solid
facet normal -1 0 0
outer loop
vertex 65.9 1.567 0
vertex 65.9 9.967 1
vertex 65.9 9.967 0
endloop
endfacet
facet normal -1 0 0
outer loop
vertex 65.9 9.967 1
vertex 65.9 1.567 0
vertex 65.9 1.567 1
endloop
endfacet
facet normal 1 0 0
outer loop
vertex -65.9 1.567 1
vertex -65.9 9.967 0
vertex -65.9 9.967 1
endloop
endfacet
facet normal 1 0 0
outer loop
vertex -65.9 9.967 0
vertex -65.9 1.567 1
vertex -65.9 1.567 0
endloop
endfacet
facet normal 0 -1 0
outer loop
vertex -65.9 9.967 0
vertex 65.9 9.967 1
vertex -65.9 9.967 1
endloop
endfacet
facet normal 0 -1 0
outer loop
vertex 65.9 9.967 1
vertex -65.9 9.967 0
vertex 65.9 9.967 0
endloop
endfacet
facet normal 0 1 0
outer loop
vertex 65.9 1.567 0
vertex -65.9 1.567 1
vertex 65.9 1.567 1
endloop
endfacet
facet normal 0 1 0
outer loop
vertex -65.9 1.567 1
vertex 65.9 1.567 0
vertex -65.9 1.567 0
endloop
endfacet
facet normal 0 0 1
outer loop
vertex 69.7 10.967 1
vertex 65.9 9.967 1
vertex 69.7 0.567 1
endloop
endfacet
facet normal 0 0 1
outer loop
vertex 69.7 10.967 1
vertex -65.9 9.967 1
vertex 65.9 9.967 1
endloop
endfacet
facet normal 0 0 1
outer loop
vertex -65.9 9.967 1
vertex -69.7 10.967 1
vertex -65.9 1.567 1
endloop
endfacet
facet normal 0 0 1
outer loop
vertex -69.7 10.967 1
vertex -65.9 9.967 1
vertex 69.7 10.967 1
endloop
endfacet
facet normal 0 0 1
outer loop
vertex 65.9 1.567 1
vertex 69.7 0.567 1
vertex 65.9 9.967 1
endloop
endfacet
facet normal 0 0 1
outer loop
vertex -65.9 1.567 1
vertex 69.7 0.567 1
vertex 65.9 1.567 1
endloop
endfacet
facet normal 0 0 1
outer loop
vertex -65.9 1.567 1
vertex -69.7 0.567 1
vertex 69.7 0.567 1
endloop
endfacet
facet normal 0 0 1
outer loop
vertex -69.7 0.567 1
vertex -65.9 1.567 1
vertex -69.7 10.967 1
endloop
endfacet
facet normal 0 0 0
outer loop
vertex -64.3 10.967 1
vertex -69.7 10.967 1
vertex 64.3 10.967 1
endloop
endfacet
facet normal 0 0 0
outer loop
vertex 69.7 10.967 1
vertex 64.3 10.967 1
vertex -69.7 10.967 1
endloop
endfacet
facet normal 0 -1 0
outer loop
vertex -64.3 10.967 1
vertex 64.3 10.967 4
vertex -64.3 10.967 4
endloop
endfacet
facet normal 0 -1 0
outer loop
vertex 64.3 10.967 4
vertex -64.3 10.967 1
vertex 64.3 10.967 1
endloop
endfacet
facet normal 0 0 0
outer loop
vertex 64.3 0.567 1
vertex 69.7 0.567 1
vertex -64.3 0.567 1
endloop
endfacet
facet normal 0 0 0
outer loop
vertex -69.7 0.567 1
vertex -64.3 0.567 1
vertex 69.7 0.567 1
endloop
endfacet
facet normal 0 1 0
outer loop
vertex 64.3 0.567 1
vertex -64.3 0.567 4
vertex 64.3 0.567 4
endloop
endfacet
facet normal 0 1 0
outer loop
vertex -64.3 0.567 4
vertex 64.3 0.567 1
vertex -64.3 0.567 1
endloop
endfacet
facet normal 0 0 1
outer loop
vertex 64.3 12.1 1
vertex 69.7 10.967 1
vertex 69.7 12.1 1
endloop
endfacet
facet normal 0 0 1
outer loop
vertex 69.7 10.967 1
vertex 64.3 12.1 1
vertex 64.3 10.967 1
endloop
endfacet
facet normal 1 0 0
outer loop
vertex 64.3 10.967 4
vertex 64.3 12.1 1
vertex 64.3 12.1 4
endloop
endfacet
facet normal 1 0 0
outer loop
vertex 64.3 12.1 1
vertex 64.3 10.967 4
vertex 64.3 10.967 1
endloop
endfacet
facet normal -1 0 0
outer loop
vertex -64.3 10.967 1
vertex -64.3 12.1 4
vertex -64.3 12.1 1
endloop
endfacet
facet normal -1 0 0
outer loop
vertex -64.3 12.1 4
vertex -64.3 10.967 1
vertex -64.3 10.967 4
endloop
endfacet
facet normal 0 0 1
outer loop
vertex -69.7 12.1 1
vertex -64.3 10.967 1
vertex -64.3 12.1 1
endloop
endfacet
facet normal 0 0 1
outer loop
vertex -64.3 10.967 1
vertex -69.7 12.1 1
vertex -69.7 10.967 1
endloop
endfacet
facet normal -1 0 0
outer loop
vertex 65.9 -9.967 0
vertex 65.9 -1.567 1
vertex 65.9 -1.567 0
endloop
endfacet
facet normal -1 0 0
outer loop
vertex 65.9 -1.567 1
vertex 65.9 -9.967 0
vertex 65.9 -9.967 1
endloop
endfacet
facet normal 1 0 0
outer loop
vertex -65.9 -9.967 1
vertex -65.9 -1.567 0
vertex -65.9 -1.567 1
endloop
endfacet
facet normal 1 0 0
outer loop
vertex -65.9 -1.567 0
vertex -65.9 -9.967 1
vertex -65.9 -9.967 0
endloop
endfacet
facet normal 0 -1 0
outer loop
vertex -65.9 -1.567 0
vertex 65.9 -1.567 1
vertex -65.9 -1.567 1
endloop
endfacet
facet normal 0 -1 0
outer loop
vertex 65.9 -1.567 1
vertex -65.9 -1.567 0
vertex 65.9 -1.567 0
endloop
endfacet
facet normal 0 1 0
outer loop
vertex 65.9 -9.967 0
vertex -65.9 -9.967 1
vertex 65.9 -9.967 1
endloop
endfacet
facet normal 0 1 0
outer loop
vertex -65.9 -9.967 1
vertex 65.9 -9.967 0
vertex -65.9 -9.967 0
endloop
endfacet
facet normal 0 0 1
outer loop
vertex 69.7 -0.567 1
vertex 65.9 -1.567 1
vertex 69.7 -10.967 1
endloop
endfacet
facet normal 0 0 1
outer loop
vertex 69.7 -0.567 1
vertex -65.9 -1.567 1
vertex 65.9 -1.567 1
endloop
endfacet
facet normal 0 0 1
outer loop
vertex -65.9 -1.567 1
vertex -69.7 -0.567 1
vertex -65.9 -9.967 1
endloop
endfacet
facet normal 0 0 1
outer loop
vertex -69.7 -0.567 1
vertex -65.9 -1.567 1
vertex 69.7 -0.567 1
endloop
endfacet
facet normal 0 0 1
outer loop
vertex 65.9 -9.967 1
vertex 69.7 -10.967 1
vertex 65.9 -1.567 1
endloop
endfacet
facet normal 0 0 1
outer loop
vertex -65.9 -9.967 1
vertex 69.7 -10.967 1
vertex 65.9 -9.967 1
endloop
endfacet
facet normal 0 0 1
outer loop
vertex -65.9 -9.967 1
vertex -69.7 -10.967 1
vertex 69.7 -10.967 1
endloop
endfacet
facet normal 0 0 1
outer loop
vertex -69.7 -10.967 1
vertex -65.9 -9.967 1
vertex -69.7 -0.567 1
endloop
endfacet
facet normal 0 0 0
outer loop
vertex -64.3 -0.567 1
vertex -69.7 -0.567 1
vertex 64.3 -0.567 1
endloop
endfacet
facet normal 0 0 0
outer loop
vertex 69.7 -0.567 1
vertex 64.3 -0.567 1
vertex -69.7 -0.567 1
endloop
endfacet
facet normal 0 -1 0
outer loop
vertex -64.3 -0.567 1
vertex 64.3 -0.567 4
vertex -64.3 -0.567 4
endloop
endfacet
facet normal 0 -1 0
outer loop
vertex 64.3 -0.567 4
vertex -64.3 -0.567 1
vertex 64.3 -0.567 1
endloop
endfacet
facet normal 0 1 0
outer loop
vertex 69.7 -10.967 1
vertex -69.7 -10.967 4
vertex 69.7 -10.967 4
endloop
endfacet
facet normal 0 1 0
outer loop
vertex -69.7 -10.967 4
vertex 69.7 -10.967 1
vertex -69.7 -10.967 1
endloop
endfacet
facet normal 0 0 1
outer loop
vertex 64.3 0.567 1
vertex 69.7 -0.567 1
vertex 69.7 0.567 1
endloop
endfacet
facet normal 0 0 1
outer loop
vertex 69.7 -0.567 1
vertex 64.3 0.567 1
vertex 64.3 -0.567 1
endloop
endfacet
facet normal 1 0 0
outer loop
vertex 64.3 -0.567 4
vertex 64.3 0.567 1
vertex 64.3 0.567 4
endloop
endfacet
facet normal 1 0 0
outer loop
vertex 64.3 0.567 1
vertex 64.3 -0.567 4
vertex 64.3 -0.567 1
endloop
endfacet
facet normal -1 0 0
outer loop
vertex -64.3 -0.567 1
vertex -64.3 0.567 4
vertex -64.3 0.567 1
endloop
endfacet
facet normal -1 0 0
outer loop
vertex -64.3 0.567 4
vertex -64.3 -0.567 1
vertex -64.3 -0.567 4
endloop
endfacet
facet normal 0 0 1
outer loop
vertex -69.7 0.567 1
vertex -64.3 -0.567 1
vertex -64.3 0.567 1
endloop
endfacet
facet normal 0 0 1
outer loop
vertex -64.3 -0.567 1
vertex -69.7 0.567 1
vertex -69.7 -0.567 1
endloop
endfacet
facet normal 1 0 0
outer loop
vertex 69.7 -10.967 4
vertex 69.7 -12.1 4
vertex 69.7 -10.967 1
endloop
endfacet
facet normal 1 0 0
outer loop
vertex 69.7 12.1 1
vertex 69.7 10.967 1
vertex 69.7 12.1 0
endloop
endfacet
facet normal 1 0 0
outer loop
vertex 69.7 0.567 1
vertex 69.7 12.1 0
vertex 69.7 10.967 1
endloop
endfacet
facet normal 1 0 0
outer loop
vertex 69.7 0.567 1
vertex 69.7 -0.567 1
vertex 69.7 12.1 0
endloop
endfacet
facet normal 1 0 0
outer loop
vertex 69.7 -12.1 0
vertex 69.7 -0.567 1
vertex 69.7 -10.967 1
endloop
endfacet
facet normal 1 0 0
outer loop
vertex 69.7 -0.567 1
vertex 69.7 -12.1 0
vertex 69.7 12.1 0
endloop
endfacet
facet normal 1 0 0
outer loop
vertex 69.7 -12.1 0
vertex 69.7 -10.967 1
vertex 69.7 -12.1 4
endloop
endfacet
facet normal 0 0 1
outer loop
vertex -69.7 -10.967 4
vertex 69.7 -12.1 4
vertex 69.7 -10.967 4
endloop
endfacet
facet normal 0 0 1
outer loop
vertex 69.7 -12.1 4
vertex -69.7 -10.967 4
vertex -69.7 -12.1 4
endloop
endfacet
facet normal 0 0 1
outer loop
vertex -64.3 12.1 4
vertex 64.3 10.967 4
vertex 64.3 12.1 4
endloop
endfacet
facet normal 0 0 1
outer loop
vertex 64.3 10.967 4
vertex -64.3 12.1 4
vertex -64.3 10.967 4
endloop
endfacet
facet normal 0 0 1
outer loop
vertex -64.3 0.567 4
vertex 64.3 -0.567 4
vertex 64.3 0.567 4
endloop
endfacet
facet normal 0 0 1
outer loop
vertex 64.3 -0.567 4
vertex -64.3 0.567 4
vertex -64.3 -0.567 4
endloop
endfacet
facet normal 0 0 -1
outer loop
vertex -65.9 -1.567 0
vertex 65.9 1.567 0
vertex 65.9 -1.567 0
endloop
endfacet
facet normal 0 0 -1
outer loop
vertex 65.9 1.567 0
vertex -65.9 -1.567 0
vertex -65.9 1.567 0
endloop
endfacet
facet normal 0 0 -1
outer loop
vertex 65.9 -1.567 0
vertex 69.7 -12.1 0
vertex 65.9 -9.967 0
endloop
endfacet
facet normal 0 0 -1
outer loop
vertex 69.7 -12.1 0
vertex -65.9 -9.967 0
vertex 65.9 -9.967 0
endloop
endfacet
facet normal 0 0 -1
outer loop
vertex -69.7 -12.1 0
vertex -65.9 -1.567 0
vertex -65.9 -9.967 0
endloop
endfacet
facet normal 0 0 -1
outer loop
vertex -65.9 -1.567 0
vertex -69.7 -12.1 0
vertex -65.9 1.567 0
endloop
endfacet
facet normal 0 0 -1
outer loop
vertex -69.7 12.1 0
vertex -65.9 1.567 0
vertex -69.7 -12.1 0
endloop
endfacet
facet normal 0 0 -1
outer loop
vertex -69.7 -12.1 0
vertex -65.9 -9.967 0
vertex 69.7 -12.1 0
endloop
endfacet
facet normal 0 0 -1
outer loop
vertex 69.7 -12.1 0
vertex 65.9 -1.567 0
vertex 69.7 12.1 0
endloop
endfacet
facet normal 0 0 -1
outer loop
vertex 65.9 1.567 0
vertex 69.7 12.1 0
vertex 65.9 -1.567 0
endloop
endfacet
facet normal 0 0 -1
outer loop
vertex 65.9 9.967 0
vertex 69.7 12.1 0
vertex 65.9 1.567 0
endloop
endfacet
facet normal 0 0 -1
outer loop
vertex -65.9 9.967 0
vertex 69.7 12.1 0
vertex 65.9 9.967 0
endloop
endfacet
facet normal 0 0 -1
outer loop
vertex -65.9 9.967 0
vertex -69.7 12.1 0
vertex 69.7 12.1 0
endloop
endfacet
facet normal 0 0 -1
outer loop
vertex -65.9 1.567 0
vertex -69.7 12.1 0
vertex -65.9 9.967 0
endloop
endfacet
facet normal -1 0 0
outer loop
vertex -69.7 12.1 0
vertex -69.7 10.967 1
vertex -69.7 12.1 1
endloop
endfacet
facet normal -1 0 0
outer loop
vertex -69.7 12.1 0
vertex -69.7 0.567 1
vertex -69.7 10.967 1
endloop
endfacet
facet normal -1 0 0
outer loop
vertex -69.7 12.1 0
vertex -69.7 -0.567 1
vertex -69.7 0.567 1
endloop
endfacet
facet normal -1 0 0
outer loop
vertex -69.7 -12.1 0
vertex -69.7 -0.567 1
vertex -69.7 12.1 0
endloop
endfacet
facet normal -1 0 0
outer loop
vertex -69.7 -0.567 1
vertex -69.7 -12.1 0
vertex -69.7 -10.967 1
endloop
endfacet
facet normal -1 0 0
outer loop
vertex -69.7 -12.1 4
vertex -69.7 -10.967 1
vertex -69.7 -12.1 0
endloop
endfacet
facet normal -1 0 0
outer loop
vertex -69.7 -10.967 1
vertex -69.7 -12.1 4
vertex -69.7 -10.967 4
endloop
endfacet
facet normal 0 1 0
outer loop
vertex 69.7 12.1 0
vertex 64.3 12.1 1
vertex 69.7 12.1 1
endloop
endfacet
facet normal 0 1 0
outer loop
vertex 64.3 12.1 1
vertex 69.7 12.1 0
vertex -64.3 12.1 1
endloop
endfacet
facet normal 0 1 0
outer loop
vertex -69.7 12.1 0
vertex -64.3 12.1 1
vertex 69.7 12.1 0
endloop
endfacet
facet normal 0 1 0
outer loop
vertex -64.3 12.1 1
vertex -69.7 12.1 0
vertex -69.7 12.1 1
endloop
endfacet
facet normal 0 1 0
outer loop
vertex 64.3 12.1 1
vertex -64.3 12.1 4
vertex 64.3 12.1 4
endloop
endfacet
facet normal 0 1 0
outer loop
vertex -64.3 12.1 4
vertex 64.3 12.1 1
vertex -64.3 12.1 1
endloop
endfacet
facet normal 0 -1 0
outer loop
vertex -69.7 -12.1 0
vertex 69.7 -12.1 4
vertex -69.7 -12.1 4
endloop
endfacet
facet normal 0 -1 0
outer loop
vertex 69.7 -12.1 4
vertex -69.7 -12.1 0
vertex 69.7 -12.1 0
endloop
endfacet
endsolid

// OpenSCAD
// -*- mode: SCAD ; c-file-style: "ellemtel" ; coding: utf-8 -*-
//
// Holder for Minox film strips
//
// A holder for Minox 11 picture film strips for use with generic flatbed
// scanners with a transparency unit and holder for 135 (35 mm) film.
//
// © 2018 Roland Sieker <ospalh@gmail.com>
// Licence: CC-BY-SA 4.0


// … to preview. You will get all parts when you click “Create Thing”.
part = "Halter"; // [Halter: Halter, Klemme: Klemme]

// Set this to “render” and click on “Create Thing” when done with the setup.
preview = 1; // [0:render, 1:preview]
// I put this in every design, but it shouldn’t make a difference on this one.

w_loch = 24.6;
// w_streifen = 9.2;  // real width
w_streifen = 9.6;  // slightly more so the movable part becomes more stable
w_bild = 8;
l_bild = 13.1;
bilder_ps = 10;


p_h = 1;
p_k = 3;

/* [Hidden] */

// Done with the customizer

// *******************************************************
// Extra parameters. These can be changed reasonably safely.


// w = 1.8;  // Wall width
// p = 1.2;  // Bottom, top plate hight
c = 0.4;  // Clearance
c_x = 0.4;
angle = 60; // Overhangs much below 60° are a problem for me

// *******************************************************
// Some shortcuts. These shouldn’t be changed

tau = 2 * PI;  // π is still wrong. τ = circumference ÷ r

xy_factor = 1/tan(angle);
// To get from a hight to a horizontal width inclined correctly
z_factor = tan(angle);  // The other way around

w_halter = w_loch - c;
w_k = w_streifen + c;
w_nut = w_k + c;
w_steg = (w_halter - 2 * w_nut) / 3;
w_x = 1.8;
b_nase = 3;
b_nnut = b_nase + c_x;
l_streifen = l_bild * bilder_ps;
l_loch_k = l_streifen + c;
l_loch_h = l_loch_k + c;
l_k = l_loch_k + 2 * w_x + c;
l_halter = l_k  + c + 2 * w_x;
w_loch_h = w_bild + c;
h_halter = p_h + p_k;

y_nut = w_steg/2 + w_nut/2;

xo_o = l_k/2 - b_nase;

some_distance = 0.6 * w_halter + 0.6 * w_streifen + w_steg;
ms = 0.01;  // Muggeseggele.

// fn for differently sized objects and fs, fa; all for preview or rendering.
pna = 40;
pnb = 15;
pa = 5;
ps = 1;
rna = 180;
rnb = 30;
ra = 1;
rs = 0.1;
function na() = (preview) ? pna : rna;
function nb() = (preview) ? pnb : rnb;
$fs = (preview) ? ps : rs;
$fa = (preview) ? pa : ra;

// *******************************************************
// End setup



// *******************************************************
// Generate the parts

print_part();
// preview_parts();
// stack_parts();

module print_part()
{
   if ("Halter" == part)
   {
      halter();
   }
   if ("Klemme" == part)
   {
      klemme();
   }
}

module preview_parts()
{
   halter();
   translate([0, some_distance, 0])
   {
      klemme();
   }
}

module stack_parts()
{
   //intersection()
   {
      color("yellow")
      {
         halter();
      }
      union()
      {
         translate([0, -y_nut, p_h+2*ms])
         {
            color("red")
            {
               klemme();
            }
         }
         translate([0, y_nut, p_h+2*ms])
         {
            color("red")
            {
               klemme();
            }
         }
      }
   }
}

// *******************************************************
// Code for the parts themselves


module halter()
{
   difference()
   {
      translate([0, 0, h_halter/2])
      {
         cube([l_halter, w_halter, h_halter], center=true);
      }
      filmloch_halter(true);
      filmloch_halter(false);
   }
}

module filmloch_halter(ot)
{
   yo = ot ? y_nut : -y_nut;
   translate([0, yo, 0])
   {
      cube([l_loch_h, w_loch_h, 2*h_halter+2*ms], center=true);
      translate([0,0, p_h+p_k/2+ms])
      {
         cube([l_halter+2*ms, w_nut, p_k+2*ms], center=true);
      }
      eine_kerbe();
      mirror()
      {
         eine_kerbe();
      }
   }
}




module klemme()
{
   difference()
   {
      translate([0,0, p_k/2])
      {
         cube([l_k, w_streifen, p_k], center=true);
      }
      cube([l_streifen, w_bild, 3*p_k], center=true);
   }
   eine_nase();
   mirror()
   {
      eine_nase();
   }
}


module eine_nase()
{
   translate([xo_o, w_streifen/2-ms, 0])
   {
      cube([b_nase, w_steg + 0.5*c , p_k+ms]);
   }

}

module eine_kerbe()
{
   translate([xo_o-c_x, w_nut/2-ms, p_h])
   {
      cube([b_nase+2*w_x+2*c_x, w_steg + c + ms, p_k+ms]);
   }
}
